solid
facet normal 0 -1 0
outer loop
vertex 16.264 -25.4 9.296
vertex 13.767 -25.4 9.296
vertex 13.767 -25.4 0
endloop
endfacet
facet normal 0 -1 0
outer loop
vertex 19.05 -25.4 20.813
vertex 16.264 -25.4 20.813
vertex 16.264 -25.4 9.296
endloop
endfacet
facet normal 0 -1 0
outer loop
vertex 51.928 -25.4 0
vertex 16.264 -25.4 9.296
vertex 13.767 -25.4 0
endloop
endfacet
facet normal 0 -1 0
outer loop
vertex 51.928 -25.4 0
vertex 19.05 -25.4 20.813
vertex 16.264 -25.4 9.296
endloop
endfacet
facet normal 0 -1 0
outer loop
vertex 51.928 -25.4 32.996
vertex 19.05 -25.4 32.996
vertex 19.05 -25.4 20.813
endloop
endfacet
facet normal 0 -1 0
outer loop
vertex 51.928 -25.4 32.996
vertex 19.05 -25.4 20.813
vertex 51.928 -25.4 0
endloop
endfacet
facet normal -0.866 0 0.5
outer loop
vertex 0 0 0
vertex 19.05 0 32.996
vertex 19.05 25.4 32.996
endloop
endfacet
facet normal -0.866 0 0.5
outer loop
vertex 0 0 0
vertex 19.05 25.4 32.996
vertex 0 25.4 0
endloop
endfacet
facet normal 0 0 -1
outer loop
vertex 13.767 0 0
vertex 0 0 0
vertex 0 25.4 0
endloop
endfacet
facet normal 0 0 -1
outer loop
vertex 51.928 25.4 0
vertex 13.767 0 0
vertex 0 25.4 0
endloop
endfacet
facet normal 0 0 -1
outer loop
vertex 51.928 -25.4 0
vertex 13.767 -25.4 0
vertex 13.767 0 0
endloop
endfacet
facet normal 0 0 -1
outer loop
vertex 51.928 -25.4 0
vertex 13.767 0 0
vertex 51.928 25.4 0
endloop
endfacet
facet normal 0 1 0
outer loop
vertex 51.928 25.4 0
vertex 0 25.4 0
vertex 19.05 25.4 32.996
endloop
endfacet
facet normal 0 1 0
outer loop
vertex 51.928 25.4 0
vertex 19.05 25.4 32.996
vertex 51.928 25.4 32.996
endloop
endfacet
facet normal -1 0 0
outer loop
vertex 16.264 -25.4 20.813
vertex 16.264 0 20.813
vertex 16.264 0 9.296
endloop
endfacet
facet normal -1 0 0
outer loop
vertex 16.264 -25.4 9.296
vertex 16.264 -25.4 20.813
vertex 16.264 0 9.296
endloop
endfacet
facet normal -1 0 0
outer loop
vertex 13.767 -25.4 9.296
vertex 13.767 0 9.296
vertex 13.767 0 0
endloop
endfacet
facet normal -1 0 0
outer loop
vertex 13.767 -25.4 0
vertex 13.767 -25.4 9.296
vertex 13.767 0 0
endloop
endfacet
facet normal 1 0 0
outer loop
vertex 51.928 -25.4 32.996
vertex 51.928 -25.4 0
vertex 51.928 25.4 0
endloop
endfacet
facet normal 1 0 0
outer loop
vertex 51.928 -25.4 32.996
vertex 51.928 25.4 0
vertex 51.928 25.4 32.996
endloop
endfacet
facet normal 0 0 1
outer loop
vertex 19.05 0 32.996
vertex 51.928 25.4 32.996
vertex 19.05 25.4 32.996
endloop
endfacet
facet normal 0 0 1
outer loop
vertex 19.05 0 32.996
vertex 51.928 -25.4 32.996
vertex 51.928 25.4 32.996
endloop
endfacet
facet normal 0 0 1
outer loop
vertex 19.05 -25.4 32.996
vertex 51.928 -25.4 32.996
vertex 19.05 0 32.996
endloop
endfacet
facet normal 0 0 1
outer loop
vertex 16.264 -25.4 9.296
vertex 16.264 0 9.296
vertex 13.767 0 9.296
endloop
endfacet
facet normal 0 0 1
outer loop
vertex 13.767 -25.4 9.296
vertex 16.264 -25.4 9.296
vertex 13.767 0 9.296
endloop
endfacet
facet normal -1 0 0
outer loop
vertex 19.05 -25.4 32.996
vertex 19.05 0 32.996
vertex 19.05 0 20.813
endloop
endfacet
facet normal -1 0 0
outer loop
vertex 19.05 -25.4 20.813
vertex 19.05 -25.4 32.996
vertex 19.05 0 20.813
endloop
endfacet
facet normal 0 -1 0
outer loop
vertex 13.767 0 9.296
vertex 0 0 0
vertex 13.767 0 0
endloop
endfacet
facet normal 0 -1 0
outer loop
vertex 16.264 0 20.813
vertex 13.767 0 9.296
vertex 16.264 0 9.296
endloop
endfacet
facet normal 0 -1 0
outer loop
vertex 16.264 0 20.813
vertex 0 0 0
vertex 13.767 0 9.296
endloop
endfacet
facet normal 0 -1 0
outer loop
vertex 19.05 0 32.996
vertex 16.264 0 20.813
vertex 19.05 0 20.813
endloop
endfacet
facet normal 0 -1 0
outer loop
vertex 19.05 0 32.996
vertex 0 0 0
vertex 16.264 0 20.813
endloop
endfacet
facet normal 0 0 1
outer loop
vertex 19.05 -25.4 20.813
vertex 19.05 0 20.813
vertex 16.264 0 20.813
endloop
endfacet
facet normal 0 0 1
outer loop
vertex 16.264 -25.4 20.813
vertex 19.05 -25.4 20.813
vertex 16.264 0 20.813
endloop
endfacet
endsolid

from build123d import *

# Parameters (mm, degrees)
F1_DEPTH = 25.4
F2_DEPTH = 25.4


with BuildPart() as f1:
    # F0 (on Front) → F1 (new body)
    with BuildSketch(Plane.XZ):
        Polygon((51.9276708364, 32.9955678842), (19.05, 32.9955678842), (19.05, 20.812753588), (16.2640828639, 20.812753588), (16.2640828639, 9.2959087342), (13.7671502117, 9.2959087342), (13.7671502117, 0), (51.9276708364, 0), align=None)
    extrude(amount=F1_DEPTH)

    # F0 (on Front) + F1_face (on face) → F2 (join)
    with BuildSketch(Plane.XZ):
        Polygon((19.05, 32.9955678842), (0, 0), (13.7671502117, 0), (13.7671502117, 9.2959087342), (16.2640828639, 9.2959087342), (16.2640828639, 20.812753588), (19.05, 20.812753588), align=None)
        Polygon((51.9276708364, 32.9955678842), (19.05, 32.9955678842), (19.05, 20.812753588), (16.2640828639, 20.812753588), (16.2640828639, 9.2959087342), (13.7671502117, 9.2959087342), (13.7671502117, 0), (51.9276708364, 0), align=None)
    with BuildSketch(Plane(origin=(34.1945571496, 0, 15.9589854534), x_dir=(1, 0, 0), z_dir=(0, 1, 0))):
        Polygon((-15.1445571496, -17.0365824308), (17.7331136869, -17.0365824308), (17.7331136869, 15.9589854534), (-20.4274069378, 15.9589854534), (-20.4274069378, 6.6630767192), (-17.9304742856, 6.6630767192), (-17.9304742856, -4.8537681345), (-15.1445571496, -4.8537681345), align=None)
    extrude(amount=-F2_DEPTH, dir=(0, -1, 0))


solid = f1.part
